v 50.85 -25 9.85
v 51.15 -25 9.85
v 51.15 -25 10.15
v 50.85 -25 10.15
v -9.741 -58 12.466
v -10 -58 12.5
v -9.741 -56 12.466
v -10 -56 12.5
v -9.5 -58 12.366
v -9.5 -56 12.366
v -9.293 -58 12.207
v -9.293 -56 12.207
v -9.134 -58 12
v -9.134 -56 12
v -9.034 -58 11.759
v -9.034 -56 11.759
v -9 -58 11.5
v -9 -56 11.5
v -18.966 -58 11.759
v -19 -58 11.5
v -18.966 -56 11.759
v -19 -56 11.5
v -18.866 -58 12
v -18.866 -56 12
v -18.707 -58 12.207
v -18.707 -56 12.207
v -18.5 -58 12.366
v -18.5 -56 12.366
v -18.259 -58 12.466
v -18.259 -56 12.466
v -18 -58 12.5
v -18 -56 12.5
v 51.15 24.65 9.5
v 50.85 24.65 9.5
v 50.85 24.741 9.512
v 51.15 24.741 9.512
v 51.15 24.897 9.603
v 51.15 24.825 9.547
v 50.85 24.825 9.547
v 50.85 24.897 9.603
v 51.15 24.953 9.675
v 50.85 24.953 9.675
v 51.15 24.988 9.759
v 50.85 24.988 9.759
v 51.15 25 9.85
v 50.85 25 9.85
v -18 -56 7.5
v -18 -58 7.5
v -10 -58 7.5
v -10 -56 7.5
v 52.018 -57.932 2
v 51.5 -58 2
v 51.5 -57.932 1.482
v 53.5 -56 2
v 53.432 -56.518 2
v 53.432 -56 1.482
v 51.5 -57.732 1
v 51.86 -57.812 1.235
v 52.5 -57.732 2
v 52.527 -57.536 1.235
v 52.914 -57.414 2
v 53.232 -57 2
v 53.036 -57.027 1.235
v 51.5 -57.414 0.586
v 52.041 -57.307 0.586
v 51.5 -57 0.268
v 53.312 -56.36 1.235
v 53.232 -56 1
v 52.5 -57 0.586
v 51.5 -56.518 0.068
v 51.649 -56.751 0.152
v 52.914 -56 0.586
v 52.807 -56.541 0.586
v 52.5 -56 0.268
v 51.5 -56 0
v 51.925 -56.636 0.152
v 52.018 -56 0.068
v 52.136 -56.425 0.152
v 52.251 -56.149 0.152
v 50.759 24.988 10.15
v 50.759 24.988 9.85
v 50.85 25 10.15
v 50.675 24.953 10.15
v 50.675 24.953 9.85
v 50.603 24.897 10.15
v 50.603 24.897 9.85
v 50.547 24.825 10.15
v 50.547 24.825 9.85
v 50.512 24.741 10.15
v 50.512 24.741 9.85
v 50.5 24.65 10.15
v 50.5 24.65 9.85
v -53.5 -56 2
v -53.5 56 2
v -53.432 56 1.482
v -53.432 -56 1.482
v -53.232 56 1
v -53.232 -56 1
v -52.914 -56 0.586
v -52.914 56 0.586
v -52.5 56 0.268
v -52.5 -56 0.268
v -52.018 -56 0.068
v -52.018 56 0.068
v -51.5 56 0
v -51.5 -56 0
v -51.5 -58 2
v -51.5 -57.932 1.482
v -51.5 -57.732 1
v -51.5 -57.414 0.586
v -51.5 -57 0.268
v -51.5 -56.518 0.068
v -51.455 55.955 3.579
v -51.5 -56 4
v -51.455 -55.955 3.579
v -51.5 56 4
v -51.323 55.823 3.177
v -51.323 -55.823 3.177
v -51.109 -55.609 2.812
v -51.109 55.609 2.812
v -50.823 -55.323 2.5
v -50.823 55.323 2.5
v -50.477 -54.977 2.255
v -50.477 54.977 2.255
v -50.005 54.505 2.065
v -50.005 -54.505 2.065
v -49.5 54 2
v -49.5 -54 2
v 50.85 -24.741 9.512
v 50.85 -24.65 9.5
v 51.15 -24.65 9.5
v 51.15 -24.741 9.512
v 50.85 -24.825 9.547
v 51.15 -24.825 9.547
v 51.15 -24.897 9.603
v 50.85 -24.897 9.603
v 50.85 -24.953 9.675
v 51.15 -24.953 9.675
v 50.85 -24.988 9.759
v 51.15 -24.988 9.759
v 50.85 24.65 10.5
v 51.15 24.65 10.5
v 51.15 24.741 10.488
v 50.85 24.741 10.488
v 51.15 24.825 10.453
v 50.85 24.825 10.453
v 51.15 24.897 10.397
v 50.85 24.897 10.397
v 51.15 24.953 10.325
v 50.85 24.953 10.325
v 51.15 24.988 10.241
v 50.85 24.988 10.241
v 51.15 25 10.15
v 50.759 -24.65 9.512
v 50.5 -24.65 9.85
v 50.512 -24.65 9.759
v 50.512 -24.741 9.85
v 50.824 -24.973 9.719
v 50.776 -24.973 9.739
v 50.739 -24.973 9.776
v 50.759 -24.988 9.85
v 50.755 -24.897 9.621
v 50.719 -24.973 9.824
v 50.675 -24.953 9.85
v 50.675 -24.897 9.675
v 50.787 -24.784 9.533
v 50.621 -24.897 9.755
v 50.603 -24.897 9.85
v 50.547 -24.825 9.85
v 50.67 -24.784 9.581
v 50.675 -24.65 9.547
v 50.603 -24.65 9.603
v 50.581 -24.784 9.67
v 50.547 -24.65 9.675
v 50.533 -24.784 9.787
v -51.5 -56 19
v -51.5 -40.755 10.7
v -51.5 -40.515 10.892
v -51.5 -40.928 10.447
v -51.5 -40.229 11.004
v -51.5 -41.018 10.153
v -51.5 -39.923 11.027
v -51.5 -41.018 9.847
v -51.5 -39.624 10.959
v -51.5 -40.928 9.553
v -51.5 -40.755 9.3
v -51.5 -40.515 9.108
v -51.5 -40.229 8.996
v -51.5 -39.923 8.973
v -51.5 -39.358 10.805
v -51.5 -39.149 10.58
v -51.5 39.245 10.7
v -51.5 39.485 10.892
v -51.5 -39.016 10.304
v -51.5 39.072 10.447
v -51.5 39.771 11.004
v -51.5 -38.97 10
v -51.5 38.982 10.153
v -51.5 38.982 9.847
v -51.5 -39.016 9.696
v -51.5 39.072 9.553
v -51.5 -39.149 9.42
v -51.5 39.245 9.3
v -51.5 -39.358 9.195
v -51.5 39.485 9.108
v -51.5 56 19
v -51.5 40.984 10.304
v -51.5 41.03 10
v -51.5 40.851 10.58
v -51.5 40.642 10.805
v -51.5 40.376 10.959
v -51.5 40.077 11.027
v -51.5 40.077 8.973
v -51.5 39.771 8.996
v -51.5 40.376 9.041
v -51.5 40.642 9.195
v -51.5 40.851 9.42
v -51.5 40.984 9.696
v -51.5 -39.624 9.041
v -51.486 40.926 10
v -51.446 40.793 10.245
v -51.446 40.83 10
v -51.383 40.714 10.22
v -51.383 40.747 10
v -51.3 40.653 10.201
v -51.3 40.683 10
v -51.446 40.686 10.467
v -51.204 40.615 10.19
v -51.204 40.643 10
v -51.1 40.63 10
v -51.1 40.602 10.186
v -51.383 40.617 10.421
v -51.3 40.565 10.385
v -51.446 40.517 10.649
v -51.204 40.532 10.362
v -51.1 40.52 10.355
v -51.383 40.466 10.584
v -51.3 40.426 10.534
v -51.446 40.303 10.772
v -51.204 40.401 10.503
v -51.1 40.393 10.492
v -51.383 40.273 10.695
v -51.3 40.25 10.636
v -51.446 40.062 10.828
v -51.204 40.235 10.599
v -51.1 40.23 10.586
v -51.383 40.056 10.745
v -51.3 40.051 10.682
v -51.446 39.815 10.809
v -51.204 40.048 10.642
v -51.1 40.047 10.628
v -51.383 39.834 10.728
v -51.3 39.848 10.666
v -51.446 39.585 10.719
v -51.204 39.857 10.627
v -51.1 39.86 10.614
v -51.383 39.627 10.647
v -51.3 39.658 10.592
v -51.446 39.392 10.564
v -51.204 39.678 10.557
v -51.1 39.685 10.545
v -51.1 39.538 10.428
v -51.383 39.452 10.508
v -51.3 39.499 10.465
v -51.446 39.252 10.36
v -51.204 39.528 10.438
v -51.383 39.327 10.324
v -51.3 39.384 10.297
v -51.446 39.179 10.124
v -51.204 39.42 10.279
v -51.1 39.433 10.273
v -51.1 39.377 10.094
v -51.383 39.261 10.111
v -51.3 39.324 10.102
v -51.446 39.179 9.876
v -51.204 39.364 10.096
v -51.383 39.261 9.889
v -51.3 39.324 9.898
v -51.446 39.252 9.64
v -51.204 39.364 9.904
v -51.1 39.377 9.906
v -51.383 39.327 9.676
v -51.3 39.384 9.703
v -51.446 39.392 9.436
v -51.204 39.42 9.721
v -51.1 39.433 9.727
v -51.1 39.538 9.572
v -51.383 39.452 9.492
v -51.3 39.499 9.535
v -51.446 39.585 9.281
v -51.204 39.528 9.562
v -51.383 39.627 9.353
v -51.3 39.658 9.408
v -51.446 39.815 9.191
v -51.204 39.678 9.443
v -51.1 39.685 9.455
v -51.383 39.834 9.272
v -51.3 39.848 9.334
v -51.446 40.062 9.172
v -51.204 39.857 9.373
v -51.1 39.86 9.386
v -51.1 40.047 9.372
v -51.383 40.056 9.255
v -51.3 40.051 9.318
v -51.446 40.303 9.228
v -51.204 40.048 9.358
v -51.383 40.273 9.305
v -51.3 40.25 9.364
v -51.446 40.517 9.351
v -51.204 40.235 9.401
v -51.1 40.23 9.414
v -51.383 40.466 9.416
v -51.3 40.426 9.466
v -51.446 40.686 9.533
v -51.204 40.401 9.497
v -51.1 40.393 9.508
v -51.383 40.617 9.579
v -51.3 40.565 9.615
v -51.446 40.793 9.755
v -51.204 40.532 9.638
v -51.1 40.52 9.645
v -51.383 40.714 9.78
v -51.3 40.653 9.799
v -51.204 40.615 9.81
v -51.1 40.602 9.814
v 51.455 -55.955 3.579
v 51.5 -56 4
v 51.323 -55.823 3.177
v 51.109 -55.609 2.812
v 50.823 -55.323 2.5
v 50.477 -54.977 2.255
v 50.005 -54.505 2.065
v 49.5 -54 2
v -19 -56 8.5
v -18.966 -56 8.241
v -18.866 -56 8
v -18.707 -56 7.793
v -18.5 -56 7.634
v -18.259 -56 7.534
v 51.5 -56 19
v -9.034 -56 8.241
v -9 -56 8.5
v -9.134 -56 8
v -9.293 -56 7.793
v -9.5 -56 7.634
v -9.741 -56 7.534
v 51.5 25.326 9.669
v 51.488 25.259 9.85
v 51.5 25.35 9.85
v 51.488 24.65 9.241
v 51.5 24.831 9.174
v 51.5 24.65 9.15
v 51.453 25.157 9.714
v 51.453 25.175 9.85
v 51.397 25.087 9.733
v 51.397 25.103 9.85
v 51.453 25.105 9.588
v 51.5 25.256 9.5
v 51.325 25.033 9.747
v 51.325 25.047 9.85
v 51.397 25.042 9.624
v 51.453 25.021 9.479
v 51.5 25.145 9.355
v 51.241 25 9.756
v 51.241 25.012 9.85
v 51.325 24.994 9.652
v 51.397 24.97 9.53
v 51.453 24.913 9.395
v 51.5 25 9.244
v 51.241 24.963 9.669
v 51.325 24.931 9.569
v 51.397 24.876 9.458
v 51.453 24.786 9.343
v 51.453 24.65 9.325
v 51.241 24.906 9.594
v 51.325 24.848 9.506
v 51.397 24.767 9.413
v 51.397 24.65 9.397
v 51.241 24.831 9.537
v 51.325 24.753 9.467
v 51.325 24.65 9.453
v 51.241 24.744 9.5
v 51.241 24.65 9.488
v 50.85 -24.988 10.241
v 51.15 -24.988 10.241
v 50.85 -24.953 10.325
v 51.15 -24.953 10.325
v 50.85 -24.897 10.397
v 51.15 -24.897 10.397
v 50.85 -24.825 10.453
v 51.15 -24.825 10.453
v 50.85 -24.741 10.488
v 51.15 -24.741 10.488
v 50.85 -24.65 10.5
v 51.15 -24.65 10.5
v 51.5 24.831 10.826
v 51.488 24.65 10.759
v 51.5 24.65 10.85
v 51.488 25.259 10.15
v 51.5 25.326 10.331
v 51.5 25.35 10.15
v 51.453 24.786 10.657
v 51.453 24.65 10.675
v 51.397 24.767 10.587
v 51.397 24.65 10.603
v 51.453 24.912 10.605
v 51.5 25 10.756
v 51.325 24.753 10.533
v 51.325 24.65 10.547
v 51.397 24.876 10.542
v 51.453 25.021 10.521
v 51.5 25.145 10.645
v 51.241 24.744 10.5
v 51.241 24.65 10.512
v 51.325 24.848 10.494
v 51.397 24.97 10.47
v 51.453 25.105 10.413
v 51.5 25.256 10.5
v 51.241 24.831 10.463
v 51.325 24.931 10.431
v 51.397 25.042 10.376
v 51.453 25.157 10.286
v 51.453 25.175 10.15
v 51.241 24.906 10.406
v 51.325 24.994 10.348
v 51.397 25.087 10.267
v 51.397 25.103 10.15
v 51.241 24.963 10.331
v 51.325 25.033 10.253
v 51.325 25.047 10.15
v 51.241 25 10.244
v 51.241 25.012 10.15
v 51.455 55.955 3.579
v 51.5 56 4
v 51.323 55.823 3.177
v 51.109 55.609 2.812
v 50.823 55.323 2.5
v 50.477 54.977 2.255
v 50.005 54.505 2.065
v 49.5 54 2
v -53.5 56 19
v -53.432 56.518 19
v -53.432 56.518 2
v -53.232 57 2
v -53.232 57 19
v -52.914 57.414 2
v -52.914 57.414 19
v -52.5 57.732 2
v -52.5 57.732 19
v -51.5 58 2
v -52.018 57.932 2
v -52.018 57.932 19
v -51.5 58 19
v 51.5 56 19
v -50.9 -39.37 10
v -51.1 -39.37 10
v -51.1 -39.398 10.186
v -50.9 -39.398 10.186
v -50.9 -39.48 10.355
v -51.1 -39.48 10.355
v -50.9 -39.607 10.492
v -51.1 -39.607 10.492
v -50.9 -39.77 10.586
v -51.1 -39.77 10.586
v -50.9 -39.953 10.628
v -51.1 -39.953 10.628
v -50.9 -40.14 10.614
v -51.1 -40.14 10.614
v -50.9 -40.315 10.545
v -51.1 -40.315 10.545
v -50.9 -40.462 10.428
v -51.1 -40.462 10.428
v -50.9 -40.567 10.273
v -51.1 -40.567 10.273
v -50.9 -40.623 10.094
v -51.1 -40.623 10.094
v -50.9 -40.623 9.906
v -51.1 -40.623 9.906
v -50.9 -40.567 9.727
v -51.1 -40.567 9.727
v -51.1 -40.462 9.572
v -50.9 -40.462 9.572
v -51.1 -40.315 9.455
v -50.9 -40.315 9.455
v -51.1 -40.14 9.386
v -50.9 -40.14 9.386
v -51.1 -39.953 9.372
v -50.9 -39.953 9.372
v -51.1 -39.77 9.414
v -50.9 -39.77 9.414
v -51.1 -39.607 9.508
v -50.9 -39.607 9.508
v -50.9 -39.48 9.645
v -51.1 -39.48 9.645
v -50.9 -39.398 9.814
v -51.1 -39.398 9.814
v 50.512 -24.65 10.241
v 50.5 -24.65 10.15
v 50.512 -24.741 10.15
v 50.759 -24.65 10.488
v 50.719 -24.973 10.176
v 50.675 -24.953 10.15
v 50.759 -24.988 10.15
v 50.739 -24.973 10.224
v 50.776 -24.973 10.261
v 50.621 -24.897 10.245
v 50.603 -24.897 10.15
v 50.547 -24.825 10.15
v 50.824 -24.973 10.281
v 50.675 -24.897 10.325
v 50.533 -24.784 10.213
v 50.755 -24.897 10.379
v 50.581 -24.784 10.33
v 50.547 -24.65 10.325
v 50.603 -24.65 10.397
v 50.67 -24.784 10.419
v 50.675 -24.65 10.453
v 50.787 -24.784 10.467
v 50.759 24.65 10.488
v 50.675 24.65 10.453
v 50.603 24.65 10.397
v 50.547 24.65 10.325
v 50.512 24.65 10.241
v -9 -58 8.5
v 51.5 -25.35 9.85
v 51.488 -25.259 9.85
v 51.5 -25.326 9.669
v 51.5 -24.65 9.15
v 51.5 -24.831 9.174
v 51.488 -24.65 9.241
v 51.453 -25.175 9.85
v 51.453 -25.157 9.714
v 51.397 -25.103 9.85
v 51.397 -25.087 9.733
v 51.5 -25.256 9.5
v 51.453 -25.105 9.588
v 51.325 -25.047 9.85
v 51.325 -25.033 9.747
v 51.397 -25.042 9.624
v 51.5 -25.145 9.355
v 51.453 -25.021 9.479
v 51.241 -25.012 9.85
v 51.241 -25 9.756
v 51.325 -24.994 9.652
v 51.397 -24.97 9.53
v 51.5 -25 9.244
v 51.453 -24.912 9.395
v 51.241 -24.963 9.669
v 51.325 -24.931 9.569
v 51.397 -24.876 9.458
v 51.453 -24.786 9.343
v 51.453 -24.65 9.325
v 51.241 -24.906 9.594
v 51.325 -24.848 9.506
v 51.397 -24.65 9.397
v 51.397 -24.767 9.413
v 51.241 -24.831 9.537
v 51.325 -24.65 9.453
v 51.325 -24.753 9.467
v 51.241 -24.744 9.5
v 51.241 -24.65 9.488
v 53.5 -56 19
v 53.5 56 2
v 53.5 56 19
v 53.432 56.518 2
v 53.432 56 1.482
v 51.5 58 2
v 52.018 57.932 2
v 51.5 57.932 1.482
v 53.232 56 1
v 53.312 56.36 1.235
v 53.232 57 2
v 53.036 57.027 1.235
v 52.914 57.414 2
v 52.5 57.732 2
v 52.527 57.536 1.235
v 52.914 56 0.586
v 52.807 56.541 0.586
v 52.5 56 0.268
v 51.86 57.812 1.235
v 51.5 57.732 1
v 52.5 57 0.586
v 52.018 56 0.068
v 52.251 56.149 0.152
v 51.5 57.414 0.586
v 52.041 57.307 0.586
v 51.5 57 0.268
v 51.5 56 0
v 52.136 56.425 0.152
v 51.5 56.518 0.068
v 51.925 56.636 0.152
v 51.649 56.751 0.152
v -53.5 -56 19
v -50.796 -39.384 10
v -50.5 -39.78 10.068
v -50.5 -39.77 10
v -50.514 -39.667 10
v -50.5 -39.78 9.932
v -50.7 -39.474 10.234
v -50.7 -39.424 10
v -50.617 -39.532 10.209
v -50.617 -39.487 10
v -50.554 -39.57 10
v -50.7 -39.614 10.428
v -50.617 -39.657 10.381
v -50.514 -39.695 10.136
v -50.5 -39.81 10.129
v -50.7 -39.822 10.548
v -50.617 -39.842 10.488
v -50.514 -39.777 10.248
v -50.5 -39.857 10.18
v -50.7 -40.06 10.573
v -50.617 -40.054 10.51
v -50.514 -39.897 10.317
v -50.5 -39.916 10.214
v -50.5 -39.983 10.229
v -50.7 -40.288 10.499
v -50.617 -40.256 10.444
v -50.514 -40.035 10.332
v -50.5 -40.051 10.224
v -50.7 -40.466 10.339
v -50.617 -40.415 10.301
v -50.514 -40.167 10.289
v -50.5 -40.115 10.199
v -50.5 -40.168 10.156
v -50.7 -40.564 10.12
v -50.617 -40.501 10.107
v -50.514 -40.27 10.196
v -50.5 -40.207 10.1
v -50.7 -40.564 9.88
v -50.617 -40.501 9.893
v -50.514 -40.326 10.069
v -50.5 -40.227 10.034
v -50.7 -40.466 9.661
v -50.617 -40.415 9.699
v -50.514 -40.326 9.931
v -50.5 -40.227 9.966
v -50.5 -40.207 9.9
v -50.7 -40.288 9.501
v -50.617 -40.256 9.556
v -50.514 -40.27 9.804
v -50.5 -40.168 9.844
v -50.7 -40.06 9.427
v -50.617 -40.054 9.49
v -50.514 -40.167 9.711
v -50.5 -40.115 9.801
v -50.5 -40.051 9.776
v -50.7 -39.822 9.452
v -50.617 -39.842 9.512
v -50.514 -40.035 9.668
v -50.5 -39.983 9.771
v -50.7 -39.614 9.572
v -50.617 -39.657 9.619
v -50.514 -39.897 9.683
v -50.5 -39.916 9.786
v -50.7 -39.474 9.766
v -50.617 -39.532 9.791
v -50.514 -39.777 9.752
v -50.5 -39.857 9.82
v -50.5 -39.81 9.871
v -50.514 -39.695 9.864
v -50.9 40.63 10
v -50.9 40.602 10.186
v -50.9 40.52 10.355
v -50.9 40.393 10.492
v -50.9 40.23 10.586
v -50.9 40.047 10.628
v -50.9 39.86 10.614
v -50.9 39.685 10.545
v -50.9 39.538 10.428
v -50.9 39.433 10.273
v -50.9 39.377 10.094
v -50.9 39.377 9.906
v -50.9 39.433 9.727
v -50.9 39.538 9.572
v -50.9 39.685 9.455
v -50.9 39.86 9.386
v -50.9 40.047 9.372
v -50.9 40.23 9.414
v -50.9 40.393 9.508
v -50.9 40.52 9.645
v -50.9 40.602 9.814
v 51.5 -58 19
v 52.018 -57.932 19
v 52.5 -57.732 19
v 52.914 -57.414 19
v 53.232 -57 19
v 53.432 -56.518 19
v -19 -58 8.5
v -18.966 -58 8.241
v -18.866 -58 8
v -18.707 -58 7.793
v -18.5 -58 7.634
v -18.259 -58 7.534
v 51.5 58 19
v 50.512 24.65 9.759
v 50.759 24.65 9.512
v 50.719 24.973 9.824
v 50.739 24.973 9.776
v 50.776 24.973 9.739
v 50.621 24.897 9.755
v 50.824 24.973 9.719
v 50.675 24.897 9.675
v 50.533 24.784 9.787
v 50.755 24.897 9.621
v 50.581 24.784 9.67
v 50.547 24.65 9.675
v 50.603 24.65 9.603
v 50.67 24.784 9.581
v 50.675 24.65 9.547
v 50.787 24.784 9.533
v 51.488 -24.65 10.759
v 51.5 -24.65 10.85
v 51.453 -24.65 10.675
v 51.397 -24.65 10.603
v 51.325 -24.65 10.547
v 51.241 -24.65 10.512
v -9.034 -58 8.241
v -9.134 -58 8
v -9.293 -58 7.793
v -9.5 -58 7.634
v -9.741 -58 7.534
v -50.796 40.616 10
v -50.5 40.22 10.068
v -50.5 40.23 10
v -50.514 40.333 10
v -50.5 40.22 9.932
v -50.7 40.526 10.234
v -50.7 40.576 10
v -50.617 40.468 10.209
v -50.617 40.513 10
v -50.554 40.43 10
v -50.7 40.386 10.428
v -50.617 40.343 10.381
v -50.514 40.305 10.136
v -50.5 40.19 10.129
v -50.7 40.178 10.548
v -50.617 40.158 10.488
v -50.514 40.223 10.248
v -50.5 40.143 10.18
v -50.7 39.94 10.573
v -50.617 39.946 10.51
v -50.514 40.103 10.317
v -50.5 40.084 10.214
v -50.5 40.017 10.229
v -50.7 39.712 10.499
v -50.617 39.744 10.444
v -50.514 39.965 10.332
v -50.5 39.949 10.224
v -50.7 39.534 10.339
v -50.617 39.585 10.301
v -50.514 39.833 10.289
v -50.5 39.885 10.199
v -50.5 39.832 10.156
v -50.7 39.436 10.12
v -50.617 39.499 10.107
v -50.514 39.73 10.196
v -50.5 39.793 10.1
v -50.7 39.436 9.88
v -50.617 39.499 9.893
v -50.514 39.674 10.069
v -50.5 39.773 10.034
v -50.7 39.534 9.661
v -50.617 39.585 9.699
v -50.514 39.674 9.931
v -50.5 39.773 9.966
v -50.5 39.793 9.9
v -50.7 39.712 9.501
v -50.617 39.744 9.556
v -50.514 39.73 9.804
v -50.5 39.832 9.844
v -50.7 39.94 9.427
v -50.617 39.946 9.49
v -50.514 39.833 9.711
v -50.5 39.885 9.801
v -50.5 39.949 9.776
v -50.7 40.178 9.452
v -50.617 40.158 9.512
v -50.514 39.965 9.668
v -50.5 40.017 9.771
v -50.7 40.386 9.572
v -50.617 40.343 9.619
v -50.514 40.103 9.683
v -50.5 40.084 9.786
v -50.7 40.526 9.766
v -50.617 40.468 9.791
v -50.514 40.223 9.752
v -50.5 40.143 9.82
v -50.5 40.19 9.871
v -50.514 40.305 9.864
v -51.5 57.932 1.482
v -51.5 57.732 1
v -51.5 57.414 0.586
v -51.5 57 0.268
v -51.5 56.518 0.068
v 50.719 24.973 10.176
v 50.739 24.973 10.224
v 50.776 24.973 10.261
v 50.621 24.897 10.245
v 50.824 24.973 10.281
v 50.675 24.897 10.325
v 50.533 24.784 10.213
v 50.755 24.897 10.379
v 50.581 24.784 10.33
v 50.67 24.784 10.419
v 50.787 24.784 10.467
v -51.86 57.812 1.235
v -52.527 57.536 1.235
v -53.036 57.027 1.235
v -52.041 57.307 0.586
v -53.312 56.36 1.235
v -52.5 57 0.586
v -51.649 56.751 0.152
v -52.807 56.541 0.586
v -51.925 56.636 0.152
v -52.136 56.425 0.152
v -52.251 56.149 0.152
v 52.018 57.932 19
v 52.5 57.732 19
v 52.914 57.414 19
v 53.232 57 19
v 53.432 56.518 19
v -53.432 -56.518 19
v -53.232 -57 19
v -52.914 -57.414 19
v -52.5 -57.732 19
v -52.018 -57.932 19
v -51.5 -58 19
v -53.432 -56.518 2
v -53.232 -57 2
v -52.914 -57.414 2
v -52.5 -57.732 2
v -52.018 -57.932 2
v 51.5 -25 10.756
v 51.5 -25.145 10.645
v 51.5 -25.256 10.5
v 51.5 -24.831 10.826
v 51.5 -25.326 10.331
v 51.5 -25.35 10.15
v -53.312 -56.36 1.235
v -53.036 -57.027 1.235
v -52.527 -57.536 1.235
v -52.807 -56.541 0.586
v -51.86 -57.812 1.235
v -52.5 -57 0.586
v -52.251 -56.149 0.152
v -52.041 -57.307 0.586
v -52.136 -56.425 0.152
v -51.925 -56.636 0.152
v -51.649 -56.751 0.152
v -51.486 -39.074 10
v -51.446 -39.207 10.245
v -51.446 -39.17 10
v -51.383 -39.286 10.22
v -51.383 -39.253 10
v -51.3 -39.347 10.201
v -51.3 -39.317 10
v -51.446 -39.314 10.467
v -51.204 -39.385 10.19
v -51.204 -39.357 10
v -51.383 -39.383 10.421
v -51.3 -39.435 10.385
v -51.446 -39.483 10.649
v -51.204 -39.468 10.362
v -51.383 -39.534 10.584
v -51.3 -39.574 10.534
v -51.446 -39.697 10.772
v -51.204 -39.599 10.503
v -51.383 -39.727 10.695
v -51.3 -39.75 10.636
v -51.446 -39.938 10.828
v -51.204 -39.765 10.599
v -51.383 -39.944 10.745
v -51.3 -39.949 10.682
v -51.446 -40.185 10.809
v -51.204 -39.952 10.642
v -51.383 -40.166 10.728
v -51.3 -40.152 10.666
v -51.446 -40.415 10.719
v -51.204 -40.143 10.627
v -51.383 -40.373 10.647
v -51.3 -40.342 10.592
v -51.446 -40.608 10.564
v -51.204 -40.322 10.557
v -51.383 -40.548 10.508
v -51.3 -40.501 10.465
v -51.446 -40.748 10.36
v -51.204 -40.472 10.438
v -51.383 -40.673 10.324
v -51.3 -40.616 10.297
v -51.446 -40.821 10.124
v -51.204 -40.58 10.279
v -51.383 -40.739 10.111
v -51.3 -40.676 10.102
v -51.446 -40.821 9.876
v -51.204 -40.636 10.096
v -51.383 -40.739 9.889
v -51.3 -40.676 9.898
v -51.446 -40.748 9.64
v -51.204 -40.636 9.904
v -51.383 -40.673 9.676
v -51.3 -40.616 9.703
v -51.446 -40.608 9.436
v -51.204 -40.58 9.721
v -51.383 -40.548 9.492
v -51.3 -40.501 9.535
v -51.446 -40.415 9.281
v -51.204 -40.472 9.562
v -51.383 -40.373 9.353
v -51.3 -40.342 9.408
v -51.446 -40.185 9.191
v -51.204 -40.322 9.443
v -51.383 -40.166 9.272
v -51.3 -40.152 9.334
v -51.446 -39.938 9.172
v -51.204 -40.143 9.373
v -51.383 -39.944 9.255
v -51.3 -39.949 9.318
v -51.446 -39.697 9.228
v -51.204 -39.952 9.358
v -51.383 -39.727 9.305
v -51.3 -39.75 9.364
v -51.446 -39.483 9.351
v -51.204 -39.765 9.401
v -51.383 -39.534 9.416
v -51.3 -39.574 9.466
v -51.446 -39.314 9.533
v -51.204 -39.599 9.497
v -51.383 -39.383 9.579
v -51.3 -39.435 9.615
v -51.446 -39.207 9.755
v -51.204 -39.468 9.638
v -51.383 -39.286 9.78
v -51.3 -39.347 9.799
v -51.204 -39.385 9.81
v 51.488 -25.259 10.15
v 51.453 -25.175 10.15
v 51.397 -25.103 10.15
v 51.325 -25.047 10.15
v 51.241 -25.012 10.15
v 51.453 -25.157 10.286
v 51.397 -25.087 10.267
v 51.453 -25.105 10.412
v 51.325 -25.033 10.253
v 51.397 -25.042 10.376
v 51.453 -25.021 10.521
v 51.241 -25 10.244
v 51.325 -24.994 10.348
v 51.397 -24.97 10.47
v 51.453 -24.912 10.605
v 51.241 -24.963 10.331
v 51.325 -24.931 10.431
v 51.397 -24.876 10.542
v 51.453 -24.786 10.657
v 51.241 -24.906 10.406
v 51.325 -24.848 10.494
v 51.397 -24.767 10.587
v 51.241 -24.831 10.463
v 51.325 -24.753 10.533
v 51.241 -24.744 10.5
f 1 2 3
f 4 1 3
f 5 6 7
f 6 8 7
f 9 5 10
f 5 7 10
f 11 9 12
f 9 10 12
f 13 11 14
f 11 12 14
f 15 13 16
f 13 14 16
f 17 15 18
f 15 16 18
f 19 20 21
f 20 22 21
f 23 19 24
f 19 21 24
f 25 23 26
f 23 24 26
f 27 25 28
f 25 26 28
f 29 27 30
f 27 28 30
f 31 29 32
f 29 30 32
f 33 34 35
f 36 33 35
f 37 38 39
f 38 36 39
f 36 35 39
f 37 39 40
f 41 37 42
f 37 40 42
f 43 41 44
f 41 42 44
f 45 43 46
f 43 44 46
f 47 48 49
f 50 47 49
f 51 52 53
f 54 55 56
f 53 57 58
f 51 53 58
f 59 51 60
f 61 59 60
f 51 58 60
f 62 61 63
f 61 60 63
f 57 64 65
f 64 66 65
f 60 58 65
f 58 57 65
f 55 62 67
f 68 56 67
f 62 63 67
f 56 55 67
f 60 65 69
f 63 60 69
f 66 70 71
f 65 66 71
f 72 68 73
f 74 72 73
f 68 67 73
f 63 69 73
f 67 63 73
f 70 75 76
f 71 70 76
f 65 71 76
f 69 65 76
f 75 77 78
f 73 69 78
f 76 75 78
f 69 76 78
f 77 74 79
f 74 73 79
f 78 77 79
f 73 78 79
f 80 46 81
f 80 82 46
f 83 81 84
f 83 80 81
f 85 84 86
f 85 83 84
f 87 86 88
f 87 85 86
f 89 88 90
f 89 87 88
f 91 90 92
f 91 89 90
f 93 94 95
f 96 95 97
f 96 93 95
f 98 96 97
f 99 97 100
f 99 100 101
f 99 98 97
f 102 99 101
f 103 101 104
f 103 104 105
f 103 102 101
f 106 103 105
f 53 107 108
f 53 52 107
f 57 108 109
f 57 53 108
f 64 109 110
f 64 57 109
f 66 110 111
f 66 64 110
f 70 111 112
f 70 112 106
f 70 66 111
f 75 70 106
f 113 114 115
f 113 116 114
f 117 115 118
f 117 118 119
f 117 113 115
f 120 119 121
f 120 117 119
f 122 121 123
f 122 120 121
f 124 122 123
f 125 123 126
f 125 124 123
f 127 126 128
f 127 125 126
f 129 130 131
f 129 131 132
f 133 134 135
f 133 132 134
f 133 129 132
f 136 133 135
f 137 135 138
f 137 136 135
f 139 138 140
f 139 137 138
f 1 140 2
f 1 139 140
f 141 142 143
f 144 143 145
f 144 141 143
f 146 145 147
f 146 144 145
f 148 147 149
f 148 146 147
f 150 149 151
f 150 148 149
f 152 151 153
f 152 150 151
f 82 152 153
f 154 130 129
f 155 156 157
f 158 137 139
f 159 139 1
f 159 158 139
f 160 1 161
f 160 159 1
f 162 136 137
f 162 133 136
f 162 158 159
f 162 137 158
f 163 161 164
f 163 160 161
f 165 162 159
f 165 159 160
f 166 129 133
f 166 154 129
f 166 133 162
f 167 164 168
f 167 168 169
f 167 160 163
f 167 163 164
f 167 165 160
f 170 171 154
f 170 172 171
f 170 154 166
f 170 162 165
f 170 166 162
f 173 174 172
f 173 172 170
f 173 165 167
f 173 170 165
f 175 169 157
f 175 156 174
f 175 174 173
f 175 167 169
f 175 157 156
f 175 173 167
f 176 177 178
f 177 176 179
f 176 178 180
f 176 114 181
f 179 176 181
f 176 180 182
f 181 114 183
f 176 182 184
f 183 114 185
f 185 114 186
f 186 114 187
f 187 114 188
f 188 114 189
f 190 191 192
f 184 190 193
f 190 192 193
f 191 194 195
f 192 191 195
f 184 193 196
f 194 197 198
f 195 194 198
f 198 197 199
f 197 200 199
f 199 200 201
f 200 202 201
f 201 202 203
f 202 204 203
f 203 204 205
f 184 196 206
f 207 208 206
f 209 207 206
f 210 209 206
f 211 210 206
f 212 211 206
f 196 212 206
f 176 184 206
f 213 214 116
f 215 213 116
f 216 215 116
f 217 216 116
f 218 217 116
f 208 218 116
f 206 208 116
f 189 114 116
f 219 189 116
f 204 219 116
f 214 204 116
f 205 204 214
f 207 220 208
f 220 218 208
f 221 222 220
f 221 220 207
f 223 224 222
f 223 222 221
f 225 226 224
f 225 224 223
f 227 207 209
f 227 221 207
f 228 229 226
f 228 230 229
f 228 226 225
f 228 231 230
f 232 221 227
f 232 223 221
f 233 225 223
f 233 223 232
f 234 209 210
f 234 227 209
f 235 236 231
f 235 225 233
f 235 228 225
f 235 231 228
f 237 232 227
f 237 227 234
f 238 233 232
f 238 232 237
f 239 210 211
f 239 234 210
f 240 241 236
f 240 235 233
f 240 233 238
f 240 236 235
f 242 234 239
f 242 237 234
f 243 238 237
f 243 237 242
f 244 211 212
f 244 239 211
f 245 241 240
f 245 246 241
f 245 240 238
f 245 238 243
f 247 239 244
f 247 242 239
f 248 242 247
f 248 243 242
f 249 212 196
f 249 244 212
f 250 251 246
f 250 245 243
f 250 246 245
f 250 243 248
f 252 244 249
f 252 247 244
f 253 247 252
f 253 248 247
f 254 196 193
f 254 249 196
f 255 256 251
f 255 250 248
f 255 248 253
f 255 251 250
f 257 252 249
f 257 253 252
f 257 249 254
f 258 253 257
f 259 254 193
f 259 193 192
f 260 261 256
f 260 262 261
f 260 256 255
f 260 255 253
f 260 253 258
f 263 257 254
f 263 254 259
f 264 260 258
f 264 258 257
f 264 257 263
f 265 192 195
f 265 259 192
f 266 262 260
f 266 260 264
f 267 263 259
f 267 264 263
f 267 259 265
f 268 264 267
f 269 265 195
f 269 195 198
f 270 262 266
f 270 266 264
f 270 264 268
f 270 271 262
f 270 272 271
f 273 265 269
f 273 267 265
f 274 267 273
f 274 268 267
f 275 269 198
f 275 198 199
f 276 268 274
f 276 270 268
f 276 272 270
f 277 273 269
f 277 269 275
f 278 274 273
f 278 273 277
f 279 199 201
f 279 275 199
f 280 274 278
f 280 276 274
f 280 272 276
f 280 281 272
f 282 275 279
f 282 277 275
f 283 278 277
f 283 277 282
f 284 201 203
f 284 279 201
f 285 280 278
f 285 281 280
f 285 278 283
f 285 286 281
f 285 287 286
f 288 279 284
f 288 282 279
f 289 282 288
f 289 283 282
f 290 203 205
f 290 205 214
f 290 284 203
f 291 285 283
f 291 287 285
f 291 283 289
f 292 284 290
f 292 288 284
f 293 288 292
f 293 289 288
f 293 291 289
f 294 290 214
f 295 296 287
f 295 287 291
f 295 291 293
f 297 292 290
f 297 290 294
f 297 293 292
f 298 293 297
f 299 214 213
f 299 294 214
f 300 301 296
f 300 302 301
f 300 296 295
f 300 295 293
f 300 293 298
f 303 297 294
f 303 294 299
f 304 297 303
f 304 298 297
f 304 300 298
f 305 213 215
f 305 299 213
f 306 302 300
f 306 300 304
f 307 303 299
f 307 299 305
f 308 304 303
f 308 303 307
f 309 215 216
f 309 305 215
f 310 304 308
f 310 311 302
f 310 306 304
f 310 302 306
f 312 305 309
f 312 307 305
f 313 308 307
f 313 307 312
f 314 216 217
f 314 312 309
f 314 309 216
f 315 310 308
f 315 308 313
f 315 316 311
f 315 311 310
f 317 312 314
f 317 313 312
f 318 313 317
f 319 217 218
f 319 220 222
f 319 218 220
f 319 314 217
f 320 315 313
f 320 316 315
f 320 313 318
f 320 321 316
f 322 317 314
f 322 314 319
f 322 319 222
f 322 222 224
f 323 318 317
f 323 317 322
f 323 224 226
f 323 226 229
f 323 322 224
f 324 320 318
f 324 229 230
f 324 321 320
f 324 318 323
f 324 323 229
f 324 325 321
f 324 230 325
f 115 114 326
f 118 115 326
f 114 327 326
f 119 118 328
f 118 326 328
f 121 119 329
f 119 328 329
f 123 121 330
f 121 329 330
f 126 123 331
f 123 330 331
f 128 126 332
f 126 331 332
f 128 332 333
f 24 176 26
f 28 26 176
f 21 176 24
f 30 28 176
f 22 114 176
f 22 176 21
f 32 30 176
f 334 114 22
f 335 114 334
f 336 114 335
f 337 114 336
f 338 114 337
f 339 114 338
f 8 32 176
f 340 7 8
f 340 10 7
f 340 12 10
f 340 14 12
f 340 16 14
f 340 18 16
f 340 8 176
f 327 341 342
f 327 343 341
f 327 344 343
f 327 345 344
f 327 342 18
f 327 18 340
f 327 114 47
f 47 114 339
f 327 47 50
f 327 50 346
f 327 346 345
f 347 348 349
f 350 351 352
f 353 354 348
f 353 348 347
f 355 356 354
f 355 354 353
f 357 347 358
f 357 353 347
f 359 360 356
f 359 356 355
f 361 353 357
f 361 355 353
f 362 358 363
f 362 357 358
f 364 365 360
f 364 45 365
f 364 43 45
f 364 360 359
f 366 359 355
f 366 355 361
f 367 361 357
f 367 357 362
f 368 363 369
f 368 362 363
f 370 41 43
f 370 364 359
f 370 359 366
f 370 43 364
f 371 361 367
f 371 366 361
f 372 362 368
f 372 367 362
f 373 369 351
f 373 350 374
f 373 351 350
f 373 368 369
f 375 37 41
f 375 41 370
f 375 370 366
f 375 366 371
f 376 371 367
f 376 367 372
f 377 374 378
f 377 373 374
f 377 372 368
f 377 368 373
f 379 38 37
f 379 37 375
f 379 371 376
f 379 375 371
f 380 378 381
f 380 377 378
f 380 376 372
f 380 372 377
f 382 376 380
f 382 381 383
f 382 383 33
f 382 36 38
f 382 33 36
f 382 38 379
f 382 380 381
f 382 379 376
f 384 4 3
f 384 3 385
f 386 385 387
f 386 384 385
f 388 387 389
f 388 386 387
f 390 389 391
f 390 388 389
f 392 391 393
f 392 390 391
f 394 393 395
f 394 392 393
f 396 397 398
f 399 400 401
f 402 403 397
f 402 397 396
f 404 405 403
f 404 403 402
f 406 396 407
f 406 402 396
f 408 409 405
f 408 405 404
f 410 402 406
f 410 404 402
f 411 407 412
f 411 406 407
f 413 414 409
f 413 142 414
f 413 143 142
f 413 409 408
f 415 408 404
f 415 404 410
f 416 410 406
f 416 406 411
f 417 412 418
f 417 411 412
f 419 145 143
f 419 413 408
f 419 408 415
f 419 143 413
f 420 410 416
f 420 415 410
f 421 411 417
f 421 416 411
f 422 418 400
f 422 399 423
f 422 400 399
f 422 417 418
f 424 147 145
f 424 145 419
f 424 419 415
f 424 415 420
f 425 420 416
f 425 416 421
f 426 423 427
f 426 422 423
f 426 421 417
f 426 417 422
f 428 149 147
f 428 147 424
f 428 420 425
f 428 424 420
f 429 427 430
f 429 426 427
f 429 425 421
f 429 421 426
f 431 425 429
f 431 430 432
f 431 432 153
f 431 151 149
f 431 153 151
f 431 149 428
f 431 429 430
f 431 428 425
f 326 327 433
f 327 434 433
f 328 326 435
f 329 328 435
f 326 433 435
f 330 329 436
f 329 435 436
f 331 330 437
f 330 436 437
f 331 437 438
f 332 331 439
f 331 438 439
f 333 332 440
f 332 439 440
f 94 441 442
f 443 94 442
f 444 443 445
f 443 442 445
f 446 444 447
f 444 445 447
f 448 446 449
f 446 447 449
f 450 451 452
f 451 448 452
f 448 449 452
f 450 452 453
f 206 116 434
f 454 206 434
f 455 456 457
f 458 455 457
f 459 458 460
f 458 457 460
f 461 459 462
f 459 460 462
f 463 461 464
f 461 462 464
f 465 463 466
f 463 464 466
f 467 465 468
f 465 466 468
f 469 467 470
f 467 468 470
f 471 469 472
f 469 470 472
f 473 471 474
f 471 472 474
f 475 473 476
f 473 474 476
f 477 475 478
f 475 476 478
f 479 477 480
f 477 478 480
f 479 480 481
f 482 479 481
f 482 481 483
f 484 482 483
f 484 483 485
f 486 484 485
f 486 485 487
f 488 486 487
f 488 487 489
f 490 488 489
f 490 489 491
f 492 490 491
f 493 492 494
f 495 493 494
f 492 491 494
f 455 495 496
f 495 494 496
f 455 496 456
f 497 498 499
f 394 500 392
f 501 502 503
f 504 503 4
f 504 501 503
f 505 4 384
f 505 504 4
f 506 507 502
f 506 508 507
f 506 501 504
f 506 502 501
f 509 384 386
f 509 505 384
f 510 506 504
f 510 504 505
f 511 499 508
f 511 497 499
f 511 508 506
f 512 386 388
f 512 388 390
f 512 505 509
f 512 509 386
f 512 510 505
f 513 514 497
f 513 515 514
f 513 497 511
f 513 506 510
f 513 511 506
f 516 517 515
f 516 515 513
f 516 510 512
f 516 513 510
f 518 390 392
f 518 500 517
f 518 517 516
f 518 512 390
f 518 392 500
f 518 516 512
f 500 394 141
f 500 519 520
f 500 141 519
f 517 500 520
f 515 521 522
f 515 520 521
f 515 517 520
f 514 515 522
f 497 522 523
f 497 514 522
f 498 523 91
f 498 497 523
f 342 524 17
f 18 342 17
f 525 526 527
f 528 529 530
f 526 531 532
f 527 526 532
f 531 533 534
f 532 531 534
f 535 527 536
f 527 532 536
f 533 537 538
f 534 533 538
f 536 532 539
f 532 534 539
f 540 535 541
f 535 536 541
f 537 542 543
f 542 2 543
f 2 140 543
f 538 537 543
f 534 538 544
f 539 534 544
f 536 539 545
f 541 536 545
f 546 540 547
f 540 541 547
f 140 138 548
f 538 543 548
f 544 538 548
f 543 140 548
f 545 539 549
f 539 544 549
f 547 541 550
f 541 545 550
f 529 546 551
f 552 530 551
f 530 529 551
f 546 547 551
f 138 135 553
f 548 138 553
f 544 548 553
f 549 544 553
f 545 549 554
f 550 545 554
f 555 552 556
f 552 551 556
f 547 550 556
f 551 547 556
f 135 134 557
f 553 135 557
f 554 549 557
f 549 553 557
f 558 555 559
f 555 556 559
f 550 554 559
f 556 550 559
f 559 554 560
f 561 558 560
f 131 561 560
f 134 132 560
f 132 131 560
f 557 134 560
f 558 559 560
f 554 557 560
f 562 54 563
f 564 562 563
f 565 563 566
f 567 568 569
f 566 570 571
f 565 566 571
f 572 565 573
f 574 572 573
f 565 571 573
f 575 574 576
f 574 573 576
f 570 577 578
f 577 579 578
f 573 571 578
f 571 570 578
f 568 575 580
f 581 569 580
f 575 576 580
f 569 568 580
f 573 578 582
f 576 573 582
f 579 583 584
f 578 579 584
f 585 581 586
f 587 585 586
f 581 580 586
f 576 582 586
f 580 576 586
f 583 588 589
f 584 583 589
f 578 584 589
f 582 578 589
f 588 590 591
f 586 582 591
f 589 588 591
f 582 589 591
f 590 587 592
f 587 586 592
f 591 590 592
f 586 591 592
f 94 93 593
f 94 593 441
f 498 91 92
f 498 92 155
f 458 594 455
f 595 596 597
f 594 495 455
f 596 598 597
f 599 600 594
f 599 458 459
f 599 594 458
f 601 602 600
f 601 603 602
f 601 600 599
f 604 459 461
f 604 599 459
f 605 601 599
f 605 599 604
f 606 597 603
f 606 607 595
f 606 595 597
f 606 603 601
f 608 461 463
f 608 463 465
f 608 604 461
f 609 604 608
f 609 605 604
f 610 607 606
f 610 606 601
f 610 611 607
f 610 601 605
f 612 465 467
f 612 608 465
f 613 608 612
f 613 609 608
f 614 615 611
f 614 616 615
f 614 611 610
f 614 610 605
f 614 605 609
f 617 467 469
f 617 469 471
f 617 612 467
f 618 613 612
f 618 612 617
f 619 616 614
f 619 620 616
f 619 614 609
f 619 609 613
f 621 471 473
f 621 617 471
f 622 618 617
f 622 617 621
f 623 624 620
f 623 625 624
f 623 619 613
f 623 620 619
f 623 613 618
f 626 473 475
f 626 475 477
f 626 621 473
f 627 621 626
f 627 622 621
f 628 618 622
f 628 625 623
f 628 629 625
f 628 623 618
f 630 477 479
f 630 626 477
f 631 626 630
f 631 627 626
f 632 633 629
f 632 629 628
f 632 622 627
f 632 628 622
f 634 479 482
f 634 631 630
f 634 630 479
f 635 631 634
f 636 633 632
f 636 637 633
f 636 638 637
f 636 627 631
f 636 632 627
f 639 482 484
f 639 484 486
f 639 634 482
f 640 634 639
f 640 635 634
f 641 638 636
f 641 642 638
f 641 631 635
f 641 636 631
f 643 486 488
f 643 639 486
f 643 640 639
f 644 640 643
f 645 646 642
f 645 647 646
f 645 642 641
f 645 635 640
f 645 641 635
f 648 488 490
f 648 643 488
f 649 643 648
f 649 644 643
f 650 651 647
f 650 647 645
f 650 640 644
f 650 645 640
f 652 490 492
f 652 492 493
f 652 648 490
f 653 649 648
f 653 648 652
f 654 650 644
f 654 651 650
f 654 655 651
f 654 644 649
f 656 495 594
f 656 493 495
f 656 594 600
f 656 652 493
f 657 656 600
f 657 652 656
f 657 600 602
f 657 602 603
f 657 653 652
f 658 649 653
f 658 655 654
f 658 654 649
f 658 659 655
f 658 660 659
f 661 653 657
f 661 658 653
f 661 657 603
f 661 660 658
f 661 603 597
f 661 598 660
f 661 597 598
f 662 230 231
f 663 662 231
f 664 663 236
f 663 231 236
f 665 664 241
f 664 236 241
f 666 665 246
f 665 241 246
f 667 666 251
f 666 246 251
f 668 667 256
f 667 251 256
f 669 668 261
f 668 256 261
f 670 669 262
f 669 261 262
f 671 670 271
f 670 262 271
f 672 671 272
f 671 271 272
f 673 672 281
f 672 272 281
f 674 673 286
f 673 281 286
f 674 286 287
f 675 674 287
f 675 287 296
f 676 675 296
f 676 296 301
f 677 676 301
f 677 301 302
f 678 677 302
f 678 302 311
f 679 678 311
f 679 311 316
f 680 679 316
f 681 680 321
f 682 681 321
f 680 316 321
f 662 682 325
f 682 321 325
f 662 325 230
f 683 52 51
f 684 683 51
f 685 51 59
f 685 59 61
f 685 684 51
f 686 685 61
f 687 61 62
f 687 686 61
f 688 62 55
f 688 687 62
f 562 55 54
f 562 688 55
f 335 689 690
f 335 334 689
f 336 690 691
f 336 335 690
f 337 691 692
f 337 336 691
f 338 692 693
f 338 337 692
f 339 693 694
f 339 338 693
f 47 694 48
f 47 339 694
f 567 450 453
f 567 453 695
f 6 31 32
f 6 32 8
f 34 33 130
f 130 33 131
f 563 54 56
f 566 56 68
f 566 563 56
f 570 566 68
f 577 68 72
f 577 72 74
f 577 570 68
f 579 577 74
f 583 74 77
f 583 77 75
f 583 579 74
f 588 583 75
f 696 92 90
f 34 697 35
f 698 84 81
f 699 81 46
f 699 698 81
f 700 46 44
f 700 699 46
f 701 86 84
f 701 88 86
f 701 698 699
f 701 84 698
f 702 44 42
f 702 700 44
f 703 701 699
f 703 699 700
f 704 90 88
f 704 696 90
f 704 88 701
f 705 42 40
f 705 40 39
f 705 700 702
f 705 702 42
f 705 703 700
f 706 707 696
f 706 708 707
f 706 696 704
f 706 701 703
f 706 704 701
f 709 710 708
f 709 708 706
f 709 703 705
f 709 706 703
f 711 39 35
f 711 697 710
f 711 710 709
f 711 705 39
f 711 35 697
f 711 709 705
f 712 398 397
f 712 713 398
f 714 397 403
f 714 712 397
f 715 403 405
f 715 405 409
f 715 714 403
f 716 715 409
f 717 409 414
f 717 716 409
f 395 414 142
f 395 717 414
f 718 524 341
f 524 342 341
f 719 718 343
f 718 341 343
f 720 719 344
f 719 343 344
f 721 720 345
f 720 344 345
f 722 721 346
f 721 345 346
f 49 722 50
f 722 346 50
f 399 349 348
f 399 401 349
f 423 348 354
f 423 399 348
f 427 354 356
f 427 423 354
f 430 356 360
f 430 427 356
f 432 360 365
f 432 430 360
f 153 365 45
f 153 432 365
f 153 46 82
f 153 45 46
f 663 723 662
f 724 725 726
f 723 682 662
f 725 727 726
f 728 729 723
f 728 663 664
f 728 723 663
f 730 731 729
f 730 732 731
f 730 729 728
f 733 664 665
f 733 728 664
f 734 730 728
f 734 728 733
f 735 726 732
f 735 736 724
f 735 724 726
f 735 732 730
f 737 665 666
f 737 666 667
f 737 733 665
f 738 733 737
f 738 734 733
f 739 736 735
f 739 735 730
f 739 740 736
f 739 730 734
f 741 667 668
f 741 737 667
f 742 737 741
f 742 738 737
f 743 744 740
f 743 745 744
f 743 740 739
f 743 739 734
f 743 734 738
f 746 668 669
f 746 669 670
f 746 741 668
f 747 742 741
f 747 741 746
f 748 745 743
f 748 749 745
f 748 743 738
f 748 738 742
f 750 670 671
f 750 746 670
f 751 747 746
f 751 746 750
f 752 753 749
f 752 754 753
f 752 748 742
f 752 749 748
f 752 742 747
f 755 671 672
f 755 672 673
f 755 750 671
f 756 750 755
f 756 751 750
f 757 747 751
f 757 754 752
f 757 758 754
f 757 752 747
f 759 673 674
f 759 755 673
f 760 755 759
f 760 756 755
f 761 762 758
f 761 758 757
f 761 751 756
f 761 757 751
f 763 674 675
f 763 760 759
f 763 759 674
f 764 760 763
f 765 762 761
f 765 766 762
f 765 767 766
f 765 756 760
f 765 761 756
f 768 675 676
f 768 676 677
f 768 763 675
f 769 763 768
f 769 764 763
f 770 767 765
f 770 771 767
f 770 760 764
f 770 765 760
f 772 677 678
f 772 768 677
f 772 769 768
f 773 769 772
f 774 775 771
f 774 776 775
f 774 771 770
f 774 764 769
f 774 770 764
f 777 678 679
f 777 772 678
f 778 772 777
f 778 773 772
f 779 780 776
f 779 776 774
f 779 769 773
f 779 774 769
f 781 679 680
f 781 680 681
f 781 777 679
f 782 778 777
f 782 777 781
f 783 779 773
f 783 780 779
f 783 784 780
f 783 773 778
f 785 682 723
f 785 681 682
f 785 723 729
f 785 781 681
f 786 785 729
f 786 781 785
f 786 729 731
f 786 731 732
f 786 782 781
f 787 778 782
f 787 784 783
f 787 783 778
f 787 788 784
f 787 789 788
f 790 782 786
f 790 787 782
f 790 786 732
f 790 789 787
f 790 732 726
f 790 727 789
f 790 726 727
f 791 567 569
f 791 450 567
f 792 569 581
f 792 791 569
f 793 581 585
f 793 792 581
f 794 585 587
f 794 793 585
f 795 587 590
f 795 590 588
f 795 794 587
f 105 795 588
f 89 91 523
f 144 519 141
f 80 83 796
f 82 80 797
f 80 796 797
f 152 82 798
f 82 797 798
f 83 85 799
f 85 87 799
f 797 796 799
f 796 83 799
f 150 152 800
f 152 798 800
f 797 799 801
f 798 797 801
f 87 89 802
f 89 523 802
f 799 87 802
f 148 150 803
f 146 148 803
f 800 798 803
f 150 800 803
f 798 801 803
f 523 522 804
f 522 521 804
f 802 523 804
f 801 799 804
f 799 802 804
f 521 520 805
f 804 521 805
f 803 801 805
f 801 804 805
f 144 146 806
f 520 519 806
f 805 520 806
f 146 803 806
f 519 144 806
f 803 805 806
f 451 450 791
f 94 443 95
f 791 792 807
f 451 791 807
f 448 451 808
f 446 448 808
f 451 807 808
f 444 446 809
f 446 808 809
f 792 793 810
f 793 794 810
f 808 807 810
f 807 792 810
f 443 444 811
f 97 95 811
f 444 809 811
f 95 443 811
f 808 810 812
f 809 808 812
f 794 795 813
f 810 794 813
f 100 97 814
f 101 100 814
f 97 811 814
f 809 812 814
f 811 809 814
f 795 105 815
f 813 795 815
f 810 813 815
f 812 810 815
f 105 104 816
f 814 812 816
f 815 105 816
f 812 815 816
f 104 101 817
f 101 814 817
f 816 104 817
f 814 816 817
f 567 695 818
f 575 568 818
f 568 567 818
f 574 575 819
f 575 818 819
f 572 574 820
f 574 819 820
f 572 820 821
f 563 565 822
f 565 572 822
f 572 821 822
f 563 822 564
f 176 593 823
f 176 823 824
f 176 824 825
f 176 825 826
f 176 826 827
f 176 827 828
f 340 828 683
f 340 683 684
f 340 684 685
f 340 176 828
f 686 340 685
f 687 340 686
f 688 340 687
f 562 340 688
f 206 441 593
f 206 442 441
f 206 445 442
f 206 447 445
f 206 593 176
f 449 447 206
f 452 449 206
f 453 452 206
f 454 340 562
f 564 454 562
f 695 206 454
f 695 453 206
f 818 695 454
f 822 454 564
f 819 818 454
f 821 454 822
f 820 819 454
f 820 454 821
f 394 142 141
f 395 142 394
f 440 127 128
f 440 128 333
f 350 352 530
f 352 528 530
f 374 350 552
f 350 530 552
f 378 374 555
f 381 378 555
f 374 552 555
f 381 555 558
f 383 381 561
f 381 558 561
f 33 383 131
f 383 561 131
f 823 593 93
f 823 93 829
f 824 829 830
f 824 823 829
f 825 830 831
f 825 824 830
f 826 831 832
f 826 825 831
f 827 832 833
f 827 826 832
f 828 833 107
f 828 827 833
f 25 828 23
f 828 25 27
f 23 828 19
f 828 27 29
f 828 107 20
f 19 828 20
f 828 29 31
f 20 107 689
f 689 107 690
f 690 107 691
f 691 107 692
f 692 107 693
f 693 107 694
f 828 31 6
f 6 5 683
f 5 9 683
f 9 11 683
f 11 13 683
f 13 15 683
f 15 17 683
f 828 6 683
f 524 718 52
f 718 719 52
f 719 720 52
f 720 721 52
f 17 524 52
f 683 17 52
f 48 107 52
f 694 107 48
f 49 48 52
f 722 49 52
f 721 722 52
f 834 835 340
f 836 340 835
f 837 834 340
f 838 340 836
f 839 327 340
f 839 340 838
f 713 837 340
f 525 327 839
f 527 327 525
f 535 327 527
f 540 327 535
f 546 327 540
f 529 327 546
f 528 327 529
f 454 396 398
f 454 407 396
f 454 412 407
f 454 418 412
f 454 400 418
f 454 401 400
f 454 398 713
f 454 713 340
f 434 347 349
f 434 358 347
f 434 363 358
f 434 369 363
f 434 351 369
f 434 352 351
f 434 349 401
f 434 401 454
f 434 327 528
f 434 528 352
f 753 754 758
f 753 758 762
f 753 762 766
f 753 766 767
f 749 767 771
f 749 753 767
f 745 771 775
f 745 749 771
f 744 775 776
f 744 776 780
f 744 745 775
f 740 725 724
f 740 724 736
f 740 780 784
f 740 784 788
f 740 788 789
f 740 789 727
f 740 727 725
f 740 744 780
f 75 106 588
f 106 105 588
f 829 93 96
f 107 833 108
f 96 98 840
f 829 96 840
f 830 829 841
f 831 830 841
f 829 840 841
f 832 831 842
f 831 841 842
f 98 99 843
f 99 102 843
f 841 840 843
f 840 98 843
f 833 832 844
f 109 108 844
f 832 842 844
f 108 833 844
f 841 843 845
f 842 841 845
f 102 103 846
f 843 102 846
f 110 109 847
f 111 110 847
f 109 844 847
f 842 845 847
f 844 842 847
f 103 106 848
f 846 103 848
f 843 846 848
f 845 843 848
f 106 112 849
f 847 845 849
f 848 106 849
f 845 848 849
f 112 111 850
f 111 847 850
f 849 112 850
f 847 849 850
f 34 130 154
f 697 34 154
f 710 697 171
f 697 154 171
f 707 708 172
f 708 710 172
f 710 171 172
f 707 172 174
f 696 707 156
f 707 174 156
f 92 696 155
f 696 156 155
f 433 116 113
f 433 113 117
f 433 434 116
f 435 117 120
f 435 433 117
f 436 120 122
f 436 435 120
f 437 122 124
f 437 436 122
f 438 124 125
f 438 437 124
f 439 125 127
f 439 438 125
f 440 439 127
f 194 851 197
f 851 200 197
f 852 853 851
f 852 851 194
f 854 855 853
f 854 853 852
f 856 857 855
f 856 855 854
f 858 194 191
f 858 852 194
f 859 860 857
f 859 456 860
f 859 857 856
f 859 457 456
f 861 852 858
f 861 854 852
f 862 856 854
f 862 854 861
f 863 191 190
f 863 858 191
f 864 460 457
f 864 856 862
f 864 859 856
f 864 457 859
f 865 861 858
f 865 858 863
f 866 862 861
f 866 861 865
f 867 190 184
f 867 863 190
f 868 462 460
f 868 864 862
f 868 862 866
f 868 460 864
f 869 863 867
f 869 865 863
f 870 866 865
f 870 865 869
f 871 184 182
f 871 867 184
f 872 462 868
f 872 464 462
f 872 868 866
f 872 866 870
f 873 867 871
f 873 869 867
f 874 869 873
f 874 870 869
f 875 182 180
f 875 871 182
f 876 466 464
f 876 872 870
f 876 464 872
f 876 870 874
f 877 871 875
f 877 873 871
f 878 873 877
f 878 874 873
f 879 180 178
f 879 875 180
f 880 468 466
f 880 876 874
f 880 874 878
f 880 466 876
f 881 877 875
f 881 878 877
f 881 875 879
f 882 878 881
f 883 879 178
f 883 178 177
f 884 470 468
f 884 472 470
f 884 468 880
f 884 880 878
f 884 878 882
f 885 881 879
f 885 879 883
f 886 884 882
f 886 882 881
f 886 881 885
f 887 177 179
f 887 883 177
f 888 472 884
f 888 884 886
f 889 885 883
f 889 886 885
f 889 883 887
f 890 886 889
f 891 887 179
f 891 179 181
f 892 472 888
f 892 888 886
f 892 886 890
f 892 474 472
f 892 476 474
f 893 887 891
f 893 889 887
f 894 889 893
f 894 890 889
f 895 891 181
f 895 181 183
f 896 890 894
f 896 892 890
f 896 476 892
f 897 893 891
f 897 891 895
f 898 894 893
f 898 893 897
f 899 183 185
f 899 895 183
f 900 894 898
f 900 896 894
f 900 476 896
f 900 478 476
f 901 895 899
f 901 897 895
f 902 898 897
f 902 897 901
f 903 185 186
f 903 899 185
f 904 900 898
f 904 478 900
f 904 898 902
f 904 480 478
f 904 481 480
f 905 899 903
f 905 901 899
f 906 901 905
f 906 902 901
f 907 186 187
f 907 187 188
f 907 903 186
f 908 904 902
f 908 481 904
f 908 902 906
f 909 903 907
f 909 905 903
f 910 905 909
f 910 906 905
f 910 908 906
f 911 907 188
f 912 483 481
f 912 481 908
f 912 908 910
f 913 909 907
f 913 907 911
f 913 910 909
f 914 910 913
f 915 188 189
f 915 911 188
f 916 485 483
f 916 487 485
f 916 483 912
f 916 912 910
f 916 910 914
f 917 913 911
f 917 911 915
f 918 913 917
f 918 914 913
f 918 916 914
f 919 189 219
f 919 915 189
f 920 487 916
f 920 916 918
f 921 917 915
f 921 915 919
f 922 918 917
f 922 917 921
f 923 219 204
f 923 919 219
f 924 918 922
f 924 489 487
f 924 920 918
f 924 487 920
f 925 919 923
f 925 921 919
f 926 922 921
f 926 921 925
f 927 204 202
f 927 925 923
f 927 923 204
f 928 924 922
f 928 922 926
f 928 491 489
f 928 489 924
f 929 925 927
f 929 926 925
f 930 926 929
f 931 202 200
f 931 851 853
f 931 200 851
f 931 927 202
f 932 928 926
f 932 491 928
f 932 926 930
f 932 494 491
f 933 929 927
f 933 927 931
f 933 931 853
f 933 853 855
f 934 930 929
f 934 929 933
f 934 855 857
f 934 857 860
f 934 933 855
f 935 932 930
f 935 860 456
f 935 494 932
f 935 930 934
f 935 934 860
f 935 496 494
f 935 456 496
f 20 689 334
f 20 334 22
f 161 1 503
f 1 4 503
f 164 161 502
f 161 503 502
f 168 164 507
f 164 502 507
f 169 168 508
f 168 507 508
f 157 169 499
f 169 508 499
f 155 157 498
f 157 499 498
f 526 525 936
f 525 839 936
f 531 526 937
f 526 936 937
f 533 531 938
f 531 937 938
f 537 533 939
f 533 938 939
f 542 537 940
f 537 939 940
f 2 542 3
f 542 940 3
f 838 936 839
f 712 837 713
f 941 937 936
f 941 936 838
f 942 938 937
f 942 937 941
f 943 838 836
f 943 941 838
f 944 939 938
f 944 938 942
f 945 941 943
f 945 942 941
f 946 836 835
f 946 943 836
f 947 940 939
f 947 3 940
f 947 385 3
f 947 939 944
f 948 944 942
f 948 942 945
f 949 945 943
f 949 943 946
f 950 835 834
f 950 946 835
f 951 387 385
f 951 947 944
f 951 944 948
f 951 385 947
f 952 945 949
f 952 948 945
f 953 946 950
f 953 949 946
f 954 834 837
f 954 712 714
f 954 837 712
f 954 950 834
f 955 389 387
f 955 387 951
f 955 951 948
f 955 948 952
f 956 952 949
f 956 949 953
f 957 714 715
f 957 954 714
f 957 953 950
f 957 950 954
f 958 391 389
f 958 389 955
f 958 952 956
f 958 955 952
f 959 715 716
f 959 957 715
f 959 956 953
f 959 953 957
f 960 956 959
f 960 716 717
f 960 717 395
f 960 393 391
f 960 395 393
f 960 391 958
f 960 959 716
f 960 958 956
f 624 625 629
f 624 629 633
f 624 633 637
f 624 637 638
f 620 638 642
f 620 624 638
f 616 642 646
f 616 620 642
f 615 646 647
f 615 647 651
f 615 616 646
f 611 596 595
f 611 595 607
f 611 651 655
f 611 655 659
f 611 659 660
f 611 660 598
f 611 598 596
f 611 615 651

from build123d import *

# Parameters (mm, degrees)
SKETCH_W     = 107
SKETCH_H     = 116
SKETCH_W_2   = 103
SKETCH_H_2   = 112
PAD_DEPTH    = 19
SKETCH001_W  = 103
SKETCH001_H  = 112
PAD001_DEPTH = 2
FILLET_R     = 2
SKETCH002_W  = 10
SKETCH002_H  = 5
POCKET_DEPTH = 5
FILLET001_R  = 1
SKETCH003_W  = 50
SKETCH003_H  = 1
PAD002_DEPTH = 1
FILLET002_R  = 0.35
SKETCH004_R  = 0.629837
PAD003_DEPTH = 1
FILLET003_R  = 0.4
FILLET004_R  = 2
FILLET005_R  = 2


with BuildPart() as part:
    # Sketch (on XY_Plane of Origin) → Pad (new body)
    with BuildSketch(Plane.XY):
        Rectangle(SKETCH_W, SKETCH_H)
        Rectangle(SKETCH_W_2, SKETCH_H_2, mode=Mode.SUBTRACT)
    extrude(amount=PAD_DEPTH)

    # Sketch001 (on XY_Plane of Origin) → Pad001 (join)
    with BuildSketch(Plane.XY):
        Rectangle(SKETCH001_W, SKETCH001_H)
    extrude(amount=PAD001_DEPTH)

    # Fillet
    fillet_edges = [part.edges().sort_by_distance(p)[0] for p in [
        (-53.5, 58, 9.5),
        (53.5, 58, 9.5),
        (53.5, -58, 9.5),
        (-53.5, -58, 9.5),
    ]]
    fillet(fillet_edges, radius=FILLET_R)

    # Sketch002 (on Face7 of Fillet) → Pocket (cut)
    with BuildSketch(Plane.XZ.offset(58)):
        with Locations((-14, 10)):
            Rectangle(SKETCH002_W, SKETCH002_H)
    extrude(amount=-POCKET_DEPTH, mode=Mode.SUBTRACT)

    # Fillet001
    fillet001_edges = [part.edges().sort_by_distance(p)[0] for p in [
        (-9, -57, 7.5),
        (-9, -57, 12.5),
        (-19, -57, 12.5),
        (-19, -57, 7.5),
    ]]
    fillet(fillet001_edges, radius=FILLET001_R)

    # Sketch003 (on Face21 of Fillet001) → Pad002 (join)
    with BuildSketch(Plane(origin=(51.5, 0, 0), x_dir=(0, -1, 0), z_dir=(-1, 0, 0))):
        with Locations((0, 10)):
            Rectangle(SKETCH003_W, SKETCH003_H)
    extrude(amount=PAD002_DEPTH)

    # Fillet002
    fillet002_edges = [part.edges().sort_by_distance(p)[0] for p in [
        (50.5, 0, 10.5),
        (50.5, 0, 9.5),
        (50.5, 25, 10),
        (51, 25, 9.5),
        (51, 25, 10.5),
        (51, -25, 9.5),
        (50.5, -25, 10),
        (51, -25, 10.5),
        (51.5, -25, 10),
        (51.5, 0, 10.5),
        (51.5, 25, 10),
        (51.5, 0, 9.5),
    ]]
    fillet(fillet002_edges, radius=FILLET002_R)

    # Sketch004 (on Face22 of Fillet002) → Pad003 (join)
    with BuildSketch(Plane.YZ.offset(-51.5)):
        with Locations((-40, 10)):
            Circle(SKETCH004_R)
        with Locations((40, 10)):
            Circle(SKETCH004_R)
    extrude(amount=PAD003_DEPTH)

    # Fillet003
    fillet003_edges = [part.edges().sort_by_distance(p)[0] for p in [
        (-51.5, -40.629837, 10),
        (-50.5, -40.629837, 10),
        (-51.5, 39.370163, 10),
        (-50.5, 39.370163, 10),
    ]]
    fillet(fillet003_edges, radius=FILLET003_R)

    # Fillet004
    fillet004_edges = [part.edges().sort_by_distance(p)[0] for p in [
        (0, -58, 0),
        (52.914214, -57.414214, 0),
        (53.5, 0, 0),
        (-52.914214, -57.414214, 0),
        (-53.5, 0, 0),
        (-52.914214, 57.414214, 0),
        (0, 58, 0),
        (52.914214, 57.414214, 0),
    ]]
    fillet(fillet004_edges, radius=FILLET004_R)

    # Fillet005
    fillet005_edges = [part.edges().sort_by_distance(p)[0] for p in [
        (0, 56, 2),
        (-51.5, 0, 2),
        (51.5, 0, 2),
        (0, -56, 2),
    ]]
    fillet(fillet005_edges, radius=FILLET005_R)


solid = part.part
